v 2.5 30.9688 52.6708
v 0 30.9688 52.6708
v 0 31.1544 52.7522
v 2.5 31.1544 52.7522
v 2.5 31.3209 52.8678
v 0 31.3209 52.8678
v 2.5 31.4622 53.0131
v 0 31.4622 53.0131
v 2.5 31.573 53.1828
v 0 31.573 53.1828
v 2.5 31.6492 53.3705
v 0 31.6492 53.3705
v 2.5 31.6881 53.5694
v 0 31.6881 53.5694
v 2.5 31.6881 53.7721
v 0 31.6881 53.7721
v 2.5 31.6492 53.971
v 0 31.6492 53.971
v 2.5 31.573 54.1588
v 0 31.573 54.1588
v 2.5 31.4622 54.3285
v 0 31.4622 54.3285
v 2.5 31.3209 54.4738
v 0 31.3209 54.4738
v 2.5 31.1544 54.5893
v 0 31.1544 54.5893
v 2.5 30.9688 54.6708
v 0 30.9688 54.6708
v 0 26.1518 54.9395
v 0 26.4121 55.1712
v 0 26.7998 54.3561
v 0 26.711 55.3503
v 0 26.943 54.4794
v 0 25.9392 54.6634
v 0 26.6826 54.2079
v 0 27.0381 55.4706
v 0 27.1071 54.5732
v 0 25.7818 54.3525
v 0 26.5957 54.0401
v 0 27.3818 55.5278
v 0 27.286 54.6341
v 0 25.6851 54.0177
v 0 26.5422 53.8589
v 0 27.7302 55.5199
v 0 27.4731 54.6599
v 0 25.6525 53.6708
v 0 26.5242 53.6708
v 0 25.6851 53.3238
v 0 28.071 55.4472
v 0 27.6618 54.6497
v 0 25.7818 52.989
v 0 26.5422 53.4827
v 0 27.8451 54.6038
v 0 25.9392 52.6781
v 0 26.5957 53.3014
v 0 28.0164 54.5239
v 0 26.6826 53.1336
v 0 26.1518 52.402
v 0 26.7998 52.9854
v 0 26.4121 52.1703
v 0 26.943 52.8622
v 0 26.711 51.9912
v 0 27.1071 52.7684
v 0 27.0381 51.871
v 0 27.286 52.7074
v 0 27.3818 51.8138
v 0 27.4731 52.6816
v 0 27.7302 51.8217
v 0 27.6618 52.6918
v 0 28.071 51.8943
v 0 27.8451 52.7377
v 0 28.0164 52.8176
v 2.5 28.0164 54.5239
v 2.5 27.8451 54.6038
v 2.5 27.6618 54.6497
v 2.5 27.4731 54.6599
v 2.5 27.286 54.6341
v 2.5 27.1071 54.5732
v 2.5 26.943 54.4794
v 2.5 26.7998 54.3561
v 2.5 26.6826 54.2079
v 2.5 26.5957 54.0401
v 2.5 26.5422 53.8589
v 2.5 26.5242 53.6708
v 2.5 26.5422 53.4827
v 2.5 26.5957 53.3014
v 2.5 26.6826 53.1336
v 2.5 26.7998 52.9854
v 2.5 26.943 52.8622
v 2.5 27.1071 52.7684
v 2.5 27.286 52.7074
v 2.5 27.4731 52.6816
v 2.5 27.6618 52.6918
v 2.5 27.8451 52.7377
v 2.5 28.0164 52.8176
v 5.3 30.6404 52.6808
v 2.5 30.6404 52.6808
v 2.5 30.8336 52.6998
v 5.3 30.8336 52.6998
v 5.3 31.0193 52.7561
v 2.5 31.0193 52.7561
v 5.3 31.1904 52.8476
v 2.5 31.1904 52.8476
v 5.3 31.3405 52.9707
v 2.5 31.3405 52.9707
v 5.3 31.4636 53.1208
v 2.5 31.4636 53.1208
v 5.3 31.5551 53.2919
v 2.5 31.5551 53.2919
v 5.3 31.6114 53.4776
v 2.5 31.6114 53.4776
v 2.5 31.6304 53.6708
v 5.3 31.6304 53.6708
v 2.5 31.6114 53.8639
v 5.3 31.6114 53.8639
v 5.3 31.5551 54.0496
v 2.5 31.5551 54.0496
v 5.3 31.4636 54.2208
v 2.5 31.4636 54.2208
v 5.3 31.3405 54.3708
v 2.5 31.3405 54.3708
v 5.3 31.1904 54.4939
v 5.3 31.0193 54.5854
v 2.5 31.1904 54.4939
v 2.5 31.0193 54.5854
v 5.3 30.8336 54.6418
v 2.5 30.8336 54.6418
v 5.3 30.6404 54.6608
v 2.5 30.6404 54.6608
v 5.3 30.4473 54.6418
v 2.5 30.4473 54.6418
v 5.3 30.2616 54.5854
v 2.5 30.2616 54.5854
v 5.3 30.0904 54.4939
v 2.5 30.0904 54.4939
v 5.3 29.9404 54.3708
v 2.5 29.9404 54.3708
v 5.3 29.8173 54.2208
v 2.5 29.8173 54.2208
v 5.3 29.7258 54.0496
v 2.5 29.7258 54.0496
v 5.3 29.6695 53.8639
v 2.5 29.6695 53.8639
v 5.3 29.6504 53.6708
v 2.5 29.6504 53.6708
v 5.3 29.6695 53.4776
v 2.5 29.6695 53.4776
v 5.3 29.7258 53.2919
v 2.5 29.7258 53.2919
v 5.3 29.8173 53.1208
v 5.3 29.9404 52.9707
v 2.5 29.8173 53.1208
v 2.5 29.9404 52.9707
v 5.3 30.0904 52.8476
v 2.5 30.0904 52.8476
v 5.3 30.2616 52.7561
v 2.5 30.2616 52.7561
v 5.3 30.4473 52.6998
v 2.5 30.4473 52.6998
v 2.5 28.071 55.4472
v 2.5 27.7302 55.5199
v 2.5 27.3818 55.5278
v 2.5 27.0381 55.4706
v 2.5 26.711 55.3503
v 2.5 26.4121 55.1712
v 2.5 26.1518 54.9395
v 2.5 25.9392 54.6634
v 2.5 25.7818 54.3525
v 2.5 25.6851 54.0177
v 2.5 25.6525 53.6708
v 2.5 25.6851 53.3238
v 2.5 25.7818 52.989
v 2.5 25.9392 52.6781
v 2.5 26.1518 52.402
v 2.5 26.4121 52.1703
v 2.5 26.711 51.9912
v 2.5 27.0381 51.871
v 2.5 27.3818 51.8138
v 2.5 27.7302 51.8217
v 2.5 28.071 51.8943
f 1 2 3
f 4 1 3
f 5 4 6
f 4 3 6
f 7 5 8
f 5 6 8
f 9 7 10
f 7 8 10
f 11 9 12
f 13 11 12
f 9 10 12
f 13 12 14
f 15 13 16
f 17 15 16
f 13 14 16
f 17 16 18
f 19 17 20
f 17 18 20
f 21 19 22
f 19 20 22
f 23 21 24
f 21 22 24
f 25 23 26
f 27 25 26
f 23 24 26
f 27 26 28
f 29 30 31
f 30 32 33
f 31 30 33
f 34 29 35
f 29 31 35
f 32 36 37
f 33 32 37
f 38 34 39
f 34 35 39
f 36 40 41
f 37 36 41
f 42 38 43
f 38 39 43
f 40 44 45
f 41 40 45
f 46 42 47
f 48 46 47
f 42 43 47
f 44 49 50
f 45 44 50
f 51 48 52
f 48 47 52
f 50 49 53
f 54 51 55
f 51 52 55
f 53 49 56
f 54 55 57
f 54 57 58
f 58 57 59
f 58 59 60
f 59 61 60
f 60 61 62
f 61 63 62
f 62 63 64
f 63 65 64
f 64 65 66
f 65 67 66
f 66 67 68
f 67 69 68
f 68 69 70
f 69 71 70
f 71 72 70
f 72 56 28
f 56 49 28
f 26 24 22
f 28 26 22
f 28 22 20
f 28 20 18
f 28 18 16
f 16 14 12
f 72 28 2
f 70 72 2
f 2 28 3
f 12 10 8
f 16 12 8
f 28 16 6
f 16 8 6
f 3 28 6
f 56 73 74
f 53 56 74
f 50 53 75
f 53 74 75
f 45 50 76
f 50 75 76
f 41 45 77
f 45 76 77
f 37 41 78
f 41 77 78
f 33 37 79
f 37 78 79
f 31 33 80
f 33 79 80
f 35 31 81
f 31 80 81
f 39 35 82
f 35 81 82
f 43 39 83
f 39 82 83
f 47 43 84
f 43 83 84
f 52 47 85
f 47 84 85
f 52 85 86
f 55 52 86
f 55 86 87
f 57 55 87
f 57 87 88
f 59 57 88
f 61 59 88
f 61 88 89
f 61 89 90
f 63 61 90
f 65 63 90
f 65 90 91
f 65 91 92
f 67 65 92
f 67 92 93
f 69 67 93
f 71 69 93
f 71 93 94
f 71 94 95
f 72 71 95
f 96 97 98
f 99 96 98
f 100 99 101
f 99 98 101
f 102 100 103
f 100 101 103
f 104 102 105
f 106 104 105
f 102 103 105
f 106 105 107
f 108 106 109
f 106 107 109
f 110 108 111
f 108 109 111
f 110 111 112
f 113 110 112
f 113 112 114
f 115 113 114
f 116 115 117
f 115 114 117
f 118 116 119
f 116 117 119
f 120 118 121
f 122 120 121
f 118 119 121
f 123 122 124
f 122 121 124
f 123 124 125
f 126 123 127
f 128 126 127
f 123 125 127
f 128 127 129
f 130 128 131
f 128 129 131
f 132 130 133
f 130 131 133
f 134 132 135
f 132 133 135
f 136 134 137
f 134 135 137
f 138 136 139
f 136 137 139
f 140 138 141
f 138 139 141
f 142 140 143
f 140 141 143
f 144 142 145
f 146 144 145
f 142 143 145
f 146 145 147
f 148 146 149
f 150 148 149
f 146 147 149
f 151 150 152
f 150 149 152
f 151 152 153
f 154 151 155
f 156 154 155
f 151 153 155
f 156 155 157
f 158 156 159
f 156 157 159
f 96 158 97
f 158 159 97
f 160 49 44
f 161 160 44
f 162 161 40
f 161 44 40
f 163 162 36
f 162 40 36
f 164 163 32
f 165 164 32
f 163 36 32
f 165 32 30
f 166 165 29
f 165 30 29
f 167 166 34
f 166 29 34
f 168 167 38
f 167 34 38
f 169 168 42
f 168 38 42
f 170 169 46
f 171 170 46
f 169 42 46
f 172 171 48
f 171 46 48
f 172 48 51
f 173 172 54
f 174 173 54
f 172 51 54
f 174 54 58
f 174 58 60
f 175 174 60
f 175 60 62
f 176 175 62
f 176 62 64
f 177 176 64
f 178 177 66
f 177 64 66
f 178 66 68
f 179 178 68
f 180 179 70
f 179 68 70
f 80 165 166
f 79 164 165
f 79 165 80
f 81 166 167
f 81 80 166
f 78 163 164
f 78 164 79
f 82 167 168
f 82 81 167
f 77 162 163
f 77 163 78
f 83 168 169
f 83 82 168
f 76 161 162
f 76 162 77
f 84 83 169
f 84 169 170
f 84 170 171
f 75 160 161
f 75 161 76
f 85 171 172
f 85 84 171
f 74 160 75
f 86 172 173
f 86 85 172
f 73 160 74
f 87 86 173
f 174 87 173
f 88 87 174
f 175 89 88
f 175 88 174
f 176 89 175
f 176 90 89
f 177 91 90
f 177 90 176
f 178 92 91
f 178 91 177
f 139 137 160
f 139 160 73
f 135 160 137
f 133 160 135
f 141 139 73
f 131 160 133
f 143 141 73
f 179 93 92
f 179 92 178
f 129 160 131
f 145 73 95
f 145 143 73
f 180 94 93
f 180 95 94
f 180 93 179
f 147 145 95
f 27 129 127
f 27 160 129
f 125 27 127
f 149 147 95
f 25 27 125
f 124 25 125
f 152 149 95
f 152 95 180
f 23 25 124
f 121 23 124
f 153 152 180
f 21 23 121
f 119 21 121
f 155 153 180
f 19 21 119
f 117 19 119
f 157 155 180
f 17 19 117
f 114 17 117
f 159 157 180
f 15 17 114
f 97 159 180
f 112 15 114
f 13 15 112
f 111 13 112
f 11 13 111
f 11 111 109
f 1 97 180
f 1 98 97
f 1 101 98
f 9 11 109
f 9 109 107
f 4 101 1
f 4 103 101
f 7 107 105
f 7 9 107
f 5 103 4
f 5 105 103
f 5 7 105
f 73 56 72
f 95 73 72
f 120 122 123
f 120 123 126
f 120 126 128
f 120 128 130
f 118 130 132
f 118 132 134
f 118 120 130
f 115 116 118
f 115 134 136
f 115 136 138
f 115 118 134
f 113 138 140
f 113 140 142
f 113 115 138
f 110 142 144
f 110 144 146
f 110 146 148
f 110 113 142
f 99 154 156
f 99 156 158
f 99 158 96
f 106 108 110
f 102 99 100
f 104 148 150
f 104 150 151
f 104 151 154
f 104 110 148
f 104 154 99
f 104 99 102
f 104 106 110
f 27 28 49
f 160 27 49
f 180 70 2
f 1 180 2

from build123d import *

# Parameters (mm, degrees)
BOSS_EXTRUDE2_DEPTH = 2.5
SKETCH4_R           = 0.99
CUT_EXTRUDE2_DEPTH  = 64.988660757
SKETCH6_R           = 0.99
BOSS_EXTRUDE4_DEPTH = 2.8
SKETCH7_W           = 2.01987101
SKETCH7_H           = 0.78494751
BOSS_EXTRUDE5_DEPTH = 2.5


with BuildPart() as part:
    # Sketch3 → Boss-Extrude2 (new body)
    with BuildSketch(Plane(origin=(0, 0, 0), x_dir=(0, 0, -1), z_dir=(1, 0, 0))):
        with BuildLine():
            Line((-54.67077374, 30.968825597), (-55.447230875, 28.071048118))
            ThreePointArc((-55.447230875, 28.071048118), (-53.67077374, 25.652507451), (-51.894316605, 28.071048118))
            Line((-51.894316605, 28.071048118), (-52.67077374, 30.968825597))
            ThreePointArc((-52.67077374, 30.968825597), (-53.67077374, 31.692969852), (-54.67077374, 30.968825597))
        make_face()
    extrude(amount=BOSS_EXTRUDE2_DEPTH)

    # Sketch4 → Cut-Extrude2 (cut, through all)
    with BuildSketch(Plane(origin=(2.5, 0, 0), x_dir=(0, 0, -1), z_dir=(1, 0, 0))):
        with Locations((-53.67077374, 27.514195996)):
            Circle(SKETCH4_R)
    extrude(amount=-CUT_EXTRUDE2_DEPTH, mode=Mode.SUBTRACT)

    # Sketch6 → Boss-Extrude4 (add)
    with BuildSketch(Plane(origin=(2.5, 0, 0), x_dir=(0, 0, -1), z_dir=(1, 0, 0))):
        with Locations((-53.67077374, 30.640427563)):
            Circle(SKETCH6_R)
    extrude(amount=BOSS_EXTRUDE4_DEPTH)

    # Sketch7 → Boss-Extrude5 (add)
    with BuildSketch(Plane(origin=(2.5, 0, 0), x_dir=(0, 0, -1), z_dir=(1, 0, 0))):
        with Locations((-53.657499813, 28.408869671)):
            Rectangle(SKETCH7_W, SKETCH7_H)
    extrude(amount=-BOSS_EXTRUDE5_DEPTH)


solid = part.part
